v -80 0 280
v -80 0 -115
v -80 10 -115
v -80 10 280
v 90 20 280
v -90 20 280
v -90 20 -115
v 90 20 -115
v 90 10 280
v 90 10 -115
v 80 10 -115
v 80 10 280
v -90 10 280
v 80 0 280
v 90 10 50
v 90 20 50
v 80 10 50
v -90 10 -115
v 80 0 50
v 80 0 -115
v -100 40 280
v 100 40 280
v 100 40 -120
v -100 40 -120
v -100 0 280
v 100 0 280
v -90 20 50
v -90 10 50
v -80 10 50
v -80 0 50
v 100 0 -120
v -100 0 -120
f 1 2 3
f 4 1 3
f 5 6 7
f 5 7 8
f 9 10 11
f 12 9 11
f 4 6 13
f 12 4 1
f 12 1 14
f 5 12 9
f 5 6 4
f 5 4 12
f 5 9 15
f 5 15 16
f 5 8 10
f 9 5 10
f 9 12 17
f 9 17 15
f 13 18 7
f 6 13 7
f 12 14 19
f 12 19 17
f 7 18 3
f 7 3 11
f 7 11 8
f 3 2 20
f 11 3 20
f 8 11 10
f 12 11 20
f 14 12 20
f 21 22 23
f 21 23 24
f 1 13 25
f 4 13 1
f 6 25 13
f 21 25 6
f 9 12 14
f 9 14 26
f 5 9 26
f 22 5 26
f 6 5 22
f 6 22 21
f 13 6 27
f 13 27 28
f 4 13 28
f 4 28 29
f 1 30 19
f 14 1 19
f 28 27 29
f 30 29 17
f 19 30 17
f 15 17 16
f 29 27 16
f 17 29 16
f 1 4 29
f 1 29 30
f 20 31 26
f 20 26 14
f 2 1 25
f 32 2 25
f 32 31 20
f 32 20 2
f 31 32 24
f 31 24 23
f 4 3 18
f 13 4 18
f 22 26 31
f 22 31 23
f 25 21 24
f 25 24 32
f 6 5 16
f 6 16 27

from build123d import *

# Parameters (mm, degrees)
F1_DEPTH      = 280
F1_DEPTH_BACK = 120
F3_DEPTH      = 230
F5_DEPTH      = 5


with BuildPart() as f1:
    # F0 (on Top) → F1 (new body, two sides)
    with BuildSketch(Plane.XY) as f1_sk:
        Polygon((80, 10), (80, 0), (100, 0), (100, 40), (0, 40), (0, 20), (90, 20), (90, 10), align=None)
        Polygon((0, 20), (0, 40), (-100, 40), (-100, 0), (-80, 0), (-80, 10), (-90, 10), (-90, 20), align=None)
    extrude(amount=F1_DEPTH)
    extrude(f1_sk.sketch, amount=-F1_DEPTH_BACK)

    # F4 (on face) → F5 (join)
    with BuildSketch(Plane(origin=(0, 0, -120), x_dir=(1, 0, 0), z_dir=(0, 0, -1))):
        Polygon((80, 0), (-80, 0), (-80, -10), (-90, -10), (-90, -20), (90, -20), (90, -10), (80, -10), align=None)
    extrude(amount=-F5_DEPTH)


with BuildPart() as f3:
    # F2 (on face) → F3 (new body)
    with BuildSketch(Plane.XY.offset(280)):
        Polygon((-80, 10), (-80, 0), (80, 0), (80, 10), (90, 10), (90, 20), (-90, 20), (-90, 10), align=None)
    extrude(amount=-F3_DEPTH)


solid = Compound([f1.part, f3.part])
